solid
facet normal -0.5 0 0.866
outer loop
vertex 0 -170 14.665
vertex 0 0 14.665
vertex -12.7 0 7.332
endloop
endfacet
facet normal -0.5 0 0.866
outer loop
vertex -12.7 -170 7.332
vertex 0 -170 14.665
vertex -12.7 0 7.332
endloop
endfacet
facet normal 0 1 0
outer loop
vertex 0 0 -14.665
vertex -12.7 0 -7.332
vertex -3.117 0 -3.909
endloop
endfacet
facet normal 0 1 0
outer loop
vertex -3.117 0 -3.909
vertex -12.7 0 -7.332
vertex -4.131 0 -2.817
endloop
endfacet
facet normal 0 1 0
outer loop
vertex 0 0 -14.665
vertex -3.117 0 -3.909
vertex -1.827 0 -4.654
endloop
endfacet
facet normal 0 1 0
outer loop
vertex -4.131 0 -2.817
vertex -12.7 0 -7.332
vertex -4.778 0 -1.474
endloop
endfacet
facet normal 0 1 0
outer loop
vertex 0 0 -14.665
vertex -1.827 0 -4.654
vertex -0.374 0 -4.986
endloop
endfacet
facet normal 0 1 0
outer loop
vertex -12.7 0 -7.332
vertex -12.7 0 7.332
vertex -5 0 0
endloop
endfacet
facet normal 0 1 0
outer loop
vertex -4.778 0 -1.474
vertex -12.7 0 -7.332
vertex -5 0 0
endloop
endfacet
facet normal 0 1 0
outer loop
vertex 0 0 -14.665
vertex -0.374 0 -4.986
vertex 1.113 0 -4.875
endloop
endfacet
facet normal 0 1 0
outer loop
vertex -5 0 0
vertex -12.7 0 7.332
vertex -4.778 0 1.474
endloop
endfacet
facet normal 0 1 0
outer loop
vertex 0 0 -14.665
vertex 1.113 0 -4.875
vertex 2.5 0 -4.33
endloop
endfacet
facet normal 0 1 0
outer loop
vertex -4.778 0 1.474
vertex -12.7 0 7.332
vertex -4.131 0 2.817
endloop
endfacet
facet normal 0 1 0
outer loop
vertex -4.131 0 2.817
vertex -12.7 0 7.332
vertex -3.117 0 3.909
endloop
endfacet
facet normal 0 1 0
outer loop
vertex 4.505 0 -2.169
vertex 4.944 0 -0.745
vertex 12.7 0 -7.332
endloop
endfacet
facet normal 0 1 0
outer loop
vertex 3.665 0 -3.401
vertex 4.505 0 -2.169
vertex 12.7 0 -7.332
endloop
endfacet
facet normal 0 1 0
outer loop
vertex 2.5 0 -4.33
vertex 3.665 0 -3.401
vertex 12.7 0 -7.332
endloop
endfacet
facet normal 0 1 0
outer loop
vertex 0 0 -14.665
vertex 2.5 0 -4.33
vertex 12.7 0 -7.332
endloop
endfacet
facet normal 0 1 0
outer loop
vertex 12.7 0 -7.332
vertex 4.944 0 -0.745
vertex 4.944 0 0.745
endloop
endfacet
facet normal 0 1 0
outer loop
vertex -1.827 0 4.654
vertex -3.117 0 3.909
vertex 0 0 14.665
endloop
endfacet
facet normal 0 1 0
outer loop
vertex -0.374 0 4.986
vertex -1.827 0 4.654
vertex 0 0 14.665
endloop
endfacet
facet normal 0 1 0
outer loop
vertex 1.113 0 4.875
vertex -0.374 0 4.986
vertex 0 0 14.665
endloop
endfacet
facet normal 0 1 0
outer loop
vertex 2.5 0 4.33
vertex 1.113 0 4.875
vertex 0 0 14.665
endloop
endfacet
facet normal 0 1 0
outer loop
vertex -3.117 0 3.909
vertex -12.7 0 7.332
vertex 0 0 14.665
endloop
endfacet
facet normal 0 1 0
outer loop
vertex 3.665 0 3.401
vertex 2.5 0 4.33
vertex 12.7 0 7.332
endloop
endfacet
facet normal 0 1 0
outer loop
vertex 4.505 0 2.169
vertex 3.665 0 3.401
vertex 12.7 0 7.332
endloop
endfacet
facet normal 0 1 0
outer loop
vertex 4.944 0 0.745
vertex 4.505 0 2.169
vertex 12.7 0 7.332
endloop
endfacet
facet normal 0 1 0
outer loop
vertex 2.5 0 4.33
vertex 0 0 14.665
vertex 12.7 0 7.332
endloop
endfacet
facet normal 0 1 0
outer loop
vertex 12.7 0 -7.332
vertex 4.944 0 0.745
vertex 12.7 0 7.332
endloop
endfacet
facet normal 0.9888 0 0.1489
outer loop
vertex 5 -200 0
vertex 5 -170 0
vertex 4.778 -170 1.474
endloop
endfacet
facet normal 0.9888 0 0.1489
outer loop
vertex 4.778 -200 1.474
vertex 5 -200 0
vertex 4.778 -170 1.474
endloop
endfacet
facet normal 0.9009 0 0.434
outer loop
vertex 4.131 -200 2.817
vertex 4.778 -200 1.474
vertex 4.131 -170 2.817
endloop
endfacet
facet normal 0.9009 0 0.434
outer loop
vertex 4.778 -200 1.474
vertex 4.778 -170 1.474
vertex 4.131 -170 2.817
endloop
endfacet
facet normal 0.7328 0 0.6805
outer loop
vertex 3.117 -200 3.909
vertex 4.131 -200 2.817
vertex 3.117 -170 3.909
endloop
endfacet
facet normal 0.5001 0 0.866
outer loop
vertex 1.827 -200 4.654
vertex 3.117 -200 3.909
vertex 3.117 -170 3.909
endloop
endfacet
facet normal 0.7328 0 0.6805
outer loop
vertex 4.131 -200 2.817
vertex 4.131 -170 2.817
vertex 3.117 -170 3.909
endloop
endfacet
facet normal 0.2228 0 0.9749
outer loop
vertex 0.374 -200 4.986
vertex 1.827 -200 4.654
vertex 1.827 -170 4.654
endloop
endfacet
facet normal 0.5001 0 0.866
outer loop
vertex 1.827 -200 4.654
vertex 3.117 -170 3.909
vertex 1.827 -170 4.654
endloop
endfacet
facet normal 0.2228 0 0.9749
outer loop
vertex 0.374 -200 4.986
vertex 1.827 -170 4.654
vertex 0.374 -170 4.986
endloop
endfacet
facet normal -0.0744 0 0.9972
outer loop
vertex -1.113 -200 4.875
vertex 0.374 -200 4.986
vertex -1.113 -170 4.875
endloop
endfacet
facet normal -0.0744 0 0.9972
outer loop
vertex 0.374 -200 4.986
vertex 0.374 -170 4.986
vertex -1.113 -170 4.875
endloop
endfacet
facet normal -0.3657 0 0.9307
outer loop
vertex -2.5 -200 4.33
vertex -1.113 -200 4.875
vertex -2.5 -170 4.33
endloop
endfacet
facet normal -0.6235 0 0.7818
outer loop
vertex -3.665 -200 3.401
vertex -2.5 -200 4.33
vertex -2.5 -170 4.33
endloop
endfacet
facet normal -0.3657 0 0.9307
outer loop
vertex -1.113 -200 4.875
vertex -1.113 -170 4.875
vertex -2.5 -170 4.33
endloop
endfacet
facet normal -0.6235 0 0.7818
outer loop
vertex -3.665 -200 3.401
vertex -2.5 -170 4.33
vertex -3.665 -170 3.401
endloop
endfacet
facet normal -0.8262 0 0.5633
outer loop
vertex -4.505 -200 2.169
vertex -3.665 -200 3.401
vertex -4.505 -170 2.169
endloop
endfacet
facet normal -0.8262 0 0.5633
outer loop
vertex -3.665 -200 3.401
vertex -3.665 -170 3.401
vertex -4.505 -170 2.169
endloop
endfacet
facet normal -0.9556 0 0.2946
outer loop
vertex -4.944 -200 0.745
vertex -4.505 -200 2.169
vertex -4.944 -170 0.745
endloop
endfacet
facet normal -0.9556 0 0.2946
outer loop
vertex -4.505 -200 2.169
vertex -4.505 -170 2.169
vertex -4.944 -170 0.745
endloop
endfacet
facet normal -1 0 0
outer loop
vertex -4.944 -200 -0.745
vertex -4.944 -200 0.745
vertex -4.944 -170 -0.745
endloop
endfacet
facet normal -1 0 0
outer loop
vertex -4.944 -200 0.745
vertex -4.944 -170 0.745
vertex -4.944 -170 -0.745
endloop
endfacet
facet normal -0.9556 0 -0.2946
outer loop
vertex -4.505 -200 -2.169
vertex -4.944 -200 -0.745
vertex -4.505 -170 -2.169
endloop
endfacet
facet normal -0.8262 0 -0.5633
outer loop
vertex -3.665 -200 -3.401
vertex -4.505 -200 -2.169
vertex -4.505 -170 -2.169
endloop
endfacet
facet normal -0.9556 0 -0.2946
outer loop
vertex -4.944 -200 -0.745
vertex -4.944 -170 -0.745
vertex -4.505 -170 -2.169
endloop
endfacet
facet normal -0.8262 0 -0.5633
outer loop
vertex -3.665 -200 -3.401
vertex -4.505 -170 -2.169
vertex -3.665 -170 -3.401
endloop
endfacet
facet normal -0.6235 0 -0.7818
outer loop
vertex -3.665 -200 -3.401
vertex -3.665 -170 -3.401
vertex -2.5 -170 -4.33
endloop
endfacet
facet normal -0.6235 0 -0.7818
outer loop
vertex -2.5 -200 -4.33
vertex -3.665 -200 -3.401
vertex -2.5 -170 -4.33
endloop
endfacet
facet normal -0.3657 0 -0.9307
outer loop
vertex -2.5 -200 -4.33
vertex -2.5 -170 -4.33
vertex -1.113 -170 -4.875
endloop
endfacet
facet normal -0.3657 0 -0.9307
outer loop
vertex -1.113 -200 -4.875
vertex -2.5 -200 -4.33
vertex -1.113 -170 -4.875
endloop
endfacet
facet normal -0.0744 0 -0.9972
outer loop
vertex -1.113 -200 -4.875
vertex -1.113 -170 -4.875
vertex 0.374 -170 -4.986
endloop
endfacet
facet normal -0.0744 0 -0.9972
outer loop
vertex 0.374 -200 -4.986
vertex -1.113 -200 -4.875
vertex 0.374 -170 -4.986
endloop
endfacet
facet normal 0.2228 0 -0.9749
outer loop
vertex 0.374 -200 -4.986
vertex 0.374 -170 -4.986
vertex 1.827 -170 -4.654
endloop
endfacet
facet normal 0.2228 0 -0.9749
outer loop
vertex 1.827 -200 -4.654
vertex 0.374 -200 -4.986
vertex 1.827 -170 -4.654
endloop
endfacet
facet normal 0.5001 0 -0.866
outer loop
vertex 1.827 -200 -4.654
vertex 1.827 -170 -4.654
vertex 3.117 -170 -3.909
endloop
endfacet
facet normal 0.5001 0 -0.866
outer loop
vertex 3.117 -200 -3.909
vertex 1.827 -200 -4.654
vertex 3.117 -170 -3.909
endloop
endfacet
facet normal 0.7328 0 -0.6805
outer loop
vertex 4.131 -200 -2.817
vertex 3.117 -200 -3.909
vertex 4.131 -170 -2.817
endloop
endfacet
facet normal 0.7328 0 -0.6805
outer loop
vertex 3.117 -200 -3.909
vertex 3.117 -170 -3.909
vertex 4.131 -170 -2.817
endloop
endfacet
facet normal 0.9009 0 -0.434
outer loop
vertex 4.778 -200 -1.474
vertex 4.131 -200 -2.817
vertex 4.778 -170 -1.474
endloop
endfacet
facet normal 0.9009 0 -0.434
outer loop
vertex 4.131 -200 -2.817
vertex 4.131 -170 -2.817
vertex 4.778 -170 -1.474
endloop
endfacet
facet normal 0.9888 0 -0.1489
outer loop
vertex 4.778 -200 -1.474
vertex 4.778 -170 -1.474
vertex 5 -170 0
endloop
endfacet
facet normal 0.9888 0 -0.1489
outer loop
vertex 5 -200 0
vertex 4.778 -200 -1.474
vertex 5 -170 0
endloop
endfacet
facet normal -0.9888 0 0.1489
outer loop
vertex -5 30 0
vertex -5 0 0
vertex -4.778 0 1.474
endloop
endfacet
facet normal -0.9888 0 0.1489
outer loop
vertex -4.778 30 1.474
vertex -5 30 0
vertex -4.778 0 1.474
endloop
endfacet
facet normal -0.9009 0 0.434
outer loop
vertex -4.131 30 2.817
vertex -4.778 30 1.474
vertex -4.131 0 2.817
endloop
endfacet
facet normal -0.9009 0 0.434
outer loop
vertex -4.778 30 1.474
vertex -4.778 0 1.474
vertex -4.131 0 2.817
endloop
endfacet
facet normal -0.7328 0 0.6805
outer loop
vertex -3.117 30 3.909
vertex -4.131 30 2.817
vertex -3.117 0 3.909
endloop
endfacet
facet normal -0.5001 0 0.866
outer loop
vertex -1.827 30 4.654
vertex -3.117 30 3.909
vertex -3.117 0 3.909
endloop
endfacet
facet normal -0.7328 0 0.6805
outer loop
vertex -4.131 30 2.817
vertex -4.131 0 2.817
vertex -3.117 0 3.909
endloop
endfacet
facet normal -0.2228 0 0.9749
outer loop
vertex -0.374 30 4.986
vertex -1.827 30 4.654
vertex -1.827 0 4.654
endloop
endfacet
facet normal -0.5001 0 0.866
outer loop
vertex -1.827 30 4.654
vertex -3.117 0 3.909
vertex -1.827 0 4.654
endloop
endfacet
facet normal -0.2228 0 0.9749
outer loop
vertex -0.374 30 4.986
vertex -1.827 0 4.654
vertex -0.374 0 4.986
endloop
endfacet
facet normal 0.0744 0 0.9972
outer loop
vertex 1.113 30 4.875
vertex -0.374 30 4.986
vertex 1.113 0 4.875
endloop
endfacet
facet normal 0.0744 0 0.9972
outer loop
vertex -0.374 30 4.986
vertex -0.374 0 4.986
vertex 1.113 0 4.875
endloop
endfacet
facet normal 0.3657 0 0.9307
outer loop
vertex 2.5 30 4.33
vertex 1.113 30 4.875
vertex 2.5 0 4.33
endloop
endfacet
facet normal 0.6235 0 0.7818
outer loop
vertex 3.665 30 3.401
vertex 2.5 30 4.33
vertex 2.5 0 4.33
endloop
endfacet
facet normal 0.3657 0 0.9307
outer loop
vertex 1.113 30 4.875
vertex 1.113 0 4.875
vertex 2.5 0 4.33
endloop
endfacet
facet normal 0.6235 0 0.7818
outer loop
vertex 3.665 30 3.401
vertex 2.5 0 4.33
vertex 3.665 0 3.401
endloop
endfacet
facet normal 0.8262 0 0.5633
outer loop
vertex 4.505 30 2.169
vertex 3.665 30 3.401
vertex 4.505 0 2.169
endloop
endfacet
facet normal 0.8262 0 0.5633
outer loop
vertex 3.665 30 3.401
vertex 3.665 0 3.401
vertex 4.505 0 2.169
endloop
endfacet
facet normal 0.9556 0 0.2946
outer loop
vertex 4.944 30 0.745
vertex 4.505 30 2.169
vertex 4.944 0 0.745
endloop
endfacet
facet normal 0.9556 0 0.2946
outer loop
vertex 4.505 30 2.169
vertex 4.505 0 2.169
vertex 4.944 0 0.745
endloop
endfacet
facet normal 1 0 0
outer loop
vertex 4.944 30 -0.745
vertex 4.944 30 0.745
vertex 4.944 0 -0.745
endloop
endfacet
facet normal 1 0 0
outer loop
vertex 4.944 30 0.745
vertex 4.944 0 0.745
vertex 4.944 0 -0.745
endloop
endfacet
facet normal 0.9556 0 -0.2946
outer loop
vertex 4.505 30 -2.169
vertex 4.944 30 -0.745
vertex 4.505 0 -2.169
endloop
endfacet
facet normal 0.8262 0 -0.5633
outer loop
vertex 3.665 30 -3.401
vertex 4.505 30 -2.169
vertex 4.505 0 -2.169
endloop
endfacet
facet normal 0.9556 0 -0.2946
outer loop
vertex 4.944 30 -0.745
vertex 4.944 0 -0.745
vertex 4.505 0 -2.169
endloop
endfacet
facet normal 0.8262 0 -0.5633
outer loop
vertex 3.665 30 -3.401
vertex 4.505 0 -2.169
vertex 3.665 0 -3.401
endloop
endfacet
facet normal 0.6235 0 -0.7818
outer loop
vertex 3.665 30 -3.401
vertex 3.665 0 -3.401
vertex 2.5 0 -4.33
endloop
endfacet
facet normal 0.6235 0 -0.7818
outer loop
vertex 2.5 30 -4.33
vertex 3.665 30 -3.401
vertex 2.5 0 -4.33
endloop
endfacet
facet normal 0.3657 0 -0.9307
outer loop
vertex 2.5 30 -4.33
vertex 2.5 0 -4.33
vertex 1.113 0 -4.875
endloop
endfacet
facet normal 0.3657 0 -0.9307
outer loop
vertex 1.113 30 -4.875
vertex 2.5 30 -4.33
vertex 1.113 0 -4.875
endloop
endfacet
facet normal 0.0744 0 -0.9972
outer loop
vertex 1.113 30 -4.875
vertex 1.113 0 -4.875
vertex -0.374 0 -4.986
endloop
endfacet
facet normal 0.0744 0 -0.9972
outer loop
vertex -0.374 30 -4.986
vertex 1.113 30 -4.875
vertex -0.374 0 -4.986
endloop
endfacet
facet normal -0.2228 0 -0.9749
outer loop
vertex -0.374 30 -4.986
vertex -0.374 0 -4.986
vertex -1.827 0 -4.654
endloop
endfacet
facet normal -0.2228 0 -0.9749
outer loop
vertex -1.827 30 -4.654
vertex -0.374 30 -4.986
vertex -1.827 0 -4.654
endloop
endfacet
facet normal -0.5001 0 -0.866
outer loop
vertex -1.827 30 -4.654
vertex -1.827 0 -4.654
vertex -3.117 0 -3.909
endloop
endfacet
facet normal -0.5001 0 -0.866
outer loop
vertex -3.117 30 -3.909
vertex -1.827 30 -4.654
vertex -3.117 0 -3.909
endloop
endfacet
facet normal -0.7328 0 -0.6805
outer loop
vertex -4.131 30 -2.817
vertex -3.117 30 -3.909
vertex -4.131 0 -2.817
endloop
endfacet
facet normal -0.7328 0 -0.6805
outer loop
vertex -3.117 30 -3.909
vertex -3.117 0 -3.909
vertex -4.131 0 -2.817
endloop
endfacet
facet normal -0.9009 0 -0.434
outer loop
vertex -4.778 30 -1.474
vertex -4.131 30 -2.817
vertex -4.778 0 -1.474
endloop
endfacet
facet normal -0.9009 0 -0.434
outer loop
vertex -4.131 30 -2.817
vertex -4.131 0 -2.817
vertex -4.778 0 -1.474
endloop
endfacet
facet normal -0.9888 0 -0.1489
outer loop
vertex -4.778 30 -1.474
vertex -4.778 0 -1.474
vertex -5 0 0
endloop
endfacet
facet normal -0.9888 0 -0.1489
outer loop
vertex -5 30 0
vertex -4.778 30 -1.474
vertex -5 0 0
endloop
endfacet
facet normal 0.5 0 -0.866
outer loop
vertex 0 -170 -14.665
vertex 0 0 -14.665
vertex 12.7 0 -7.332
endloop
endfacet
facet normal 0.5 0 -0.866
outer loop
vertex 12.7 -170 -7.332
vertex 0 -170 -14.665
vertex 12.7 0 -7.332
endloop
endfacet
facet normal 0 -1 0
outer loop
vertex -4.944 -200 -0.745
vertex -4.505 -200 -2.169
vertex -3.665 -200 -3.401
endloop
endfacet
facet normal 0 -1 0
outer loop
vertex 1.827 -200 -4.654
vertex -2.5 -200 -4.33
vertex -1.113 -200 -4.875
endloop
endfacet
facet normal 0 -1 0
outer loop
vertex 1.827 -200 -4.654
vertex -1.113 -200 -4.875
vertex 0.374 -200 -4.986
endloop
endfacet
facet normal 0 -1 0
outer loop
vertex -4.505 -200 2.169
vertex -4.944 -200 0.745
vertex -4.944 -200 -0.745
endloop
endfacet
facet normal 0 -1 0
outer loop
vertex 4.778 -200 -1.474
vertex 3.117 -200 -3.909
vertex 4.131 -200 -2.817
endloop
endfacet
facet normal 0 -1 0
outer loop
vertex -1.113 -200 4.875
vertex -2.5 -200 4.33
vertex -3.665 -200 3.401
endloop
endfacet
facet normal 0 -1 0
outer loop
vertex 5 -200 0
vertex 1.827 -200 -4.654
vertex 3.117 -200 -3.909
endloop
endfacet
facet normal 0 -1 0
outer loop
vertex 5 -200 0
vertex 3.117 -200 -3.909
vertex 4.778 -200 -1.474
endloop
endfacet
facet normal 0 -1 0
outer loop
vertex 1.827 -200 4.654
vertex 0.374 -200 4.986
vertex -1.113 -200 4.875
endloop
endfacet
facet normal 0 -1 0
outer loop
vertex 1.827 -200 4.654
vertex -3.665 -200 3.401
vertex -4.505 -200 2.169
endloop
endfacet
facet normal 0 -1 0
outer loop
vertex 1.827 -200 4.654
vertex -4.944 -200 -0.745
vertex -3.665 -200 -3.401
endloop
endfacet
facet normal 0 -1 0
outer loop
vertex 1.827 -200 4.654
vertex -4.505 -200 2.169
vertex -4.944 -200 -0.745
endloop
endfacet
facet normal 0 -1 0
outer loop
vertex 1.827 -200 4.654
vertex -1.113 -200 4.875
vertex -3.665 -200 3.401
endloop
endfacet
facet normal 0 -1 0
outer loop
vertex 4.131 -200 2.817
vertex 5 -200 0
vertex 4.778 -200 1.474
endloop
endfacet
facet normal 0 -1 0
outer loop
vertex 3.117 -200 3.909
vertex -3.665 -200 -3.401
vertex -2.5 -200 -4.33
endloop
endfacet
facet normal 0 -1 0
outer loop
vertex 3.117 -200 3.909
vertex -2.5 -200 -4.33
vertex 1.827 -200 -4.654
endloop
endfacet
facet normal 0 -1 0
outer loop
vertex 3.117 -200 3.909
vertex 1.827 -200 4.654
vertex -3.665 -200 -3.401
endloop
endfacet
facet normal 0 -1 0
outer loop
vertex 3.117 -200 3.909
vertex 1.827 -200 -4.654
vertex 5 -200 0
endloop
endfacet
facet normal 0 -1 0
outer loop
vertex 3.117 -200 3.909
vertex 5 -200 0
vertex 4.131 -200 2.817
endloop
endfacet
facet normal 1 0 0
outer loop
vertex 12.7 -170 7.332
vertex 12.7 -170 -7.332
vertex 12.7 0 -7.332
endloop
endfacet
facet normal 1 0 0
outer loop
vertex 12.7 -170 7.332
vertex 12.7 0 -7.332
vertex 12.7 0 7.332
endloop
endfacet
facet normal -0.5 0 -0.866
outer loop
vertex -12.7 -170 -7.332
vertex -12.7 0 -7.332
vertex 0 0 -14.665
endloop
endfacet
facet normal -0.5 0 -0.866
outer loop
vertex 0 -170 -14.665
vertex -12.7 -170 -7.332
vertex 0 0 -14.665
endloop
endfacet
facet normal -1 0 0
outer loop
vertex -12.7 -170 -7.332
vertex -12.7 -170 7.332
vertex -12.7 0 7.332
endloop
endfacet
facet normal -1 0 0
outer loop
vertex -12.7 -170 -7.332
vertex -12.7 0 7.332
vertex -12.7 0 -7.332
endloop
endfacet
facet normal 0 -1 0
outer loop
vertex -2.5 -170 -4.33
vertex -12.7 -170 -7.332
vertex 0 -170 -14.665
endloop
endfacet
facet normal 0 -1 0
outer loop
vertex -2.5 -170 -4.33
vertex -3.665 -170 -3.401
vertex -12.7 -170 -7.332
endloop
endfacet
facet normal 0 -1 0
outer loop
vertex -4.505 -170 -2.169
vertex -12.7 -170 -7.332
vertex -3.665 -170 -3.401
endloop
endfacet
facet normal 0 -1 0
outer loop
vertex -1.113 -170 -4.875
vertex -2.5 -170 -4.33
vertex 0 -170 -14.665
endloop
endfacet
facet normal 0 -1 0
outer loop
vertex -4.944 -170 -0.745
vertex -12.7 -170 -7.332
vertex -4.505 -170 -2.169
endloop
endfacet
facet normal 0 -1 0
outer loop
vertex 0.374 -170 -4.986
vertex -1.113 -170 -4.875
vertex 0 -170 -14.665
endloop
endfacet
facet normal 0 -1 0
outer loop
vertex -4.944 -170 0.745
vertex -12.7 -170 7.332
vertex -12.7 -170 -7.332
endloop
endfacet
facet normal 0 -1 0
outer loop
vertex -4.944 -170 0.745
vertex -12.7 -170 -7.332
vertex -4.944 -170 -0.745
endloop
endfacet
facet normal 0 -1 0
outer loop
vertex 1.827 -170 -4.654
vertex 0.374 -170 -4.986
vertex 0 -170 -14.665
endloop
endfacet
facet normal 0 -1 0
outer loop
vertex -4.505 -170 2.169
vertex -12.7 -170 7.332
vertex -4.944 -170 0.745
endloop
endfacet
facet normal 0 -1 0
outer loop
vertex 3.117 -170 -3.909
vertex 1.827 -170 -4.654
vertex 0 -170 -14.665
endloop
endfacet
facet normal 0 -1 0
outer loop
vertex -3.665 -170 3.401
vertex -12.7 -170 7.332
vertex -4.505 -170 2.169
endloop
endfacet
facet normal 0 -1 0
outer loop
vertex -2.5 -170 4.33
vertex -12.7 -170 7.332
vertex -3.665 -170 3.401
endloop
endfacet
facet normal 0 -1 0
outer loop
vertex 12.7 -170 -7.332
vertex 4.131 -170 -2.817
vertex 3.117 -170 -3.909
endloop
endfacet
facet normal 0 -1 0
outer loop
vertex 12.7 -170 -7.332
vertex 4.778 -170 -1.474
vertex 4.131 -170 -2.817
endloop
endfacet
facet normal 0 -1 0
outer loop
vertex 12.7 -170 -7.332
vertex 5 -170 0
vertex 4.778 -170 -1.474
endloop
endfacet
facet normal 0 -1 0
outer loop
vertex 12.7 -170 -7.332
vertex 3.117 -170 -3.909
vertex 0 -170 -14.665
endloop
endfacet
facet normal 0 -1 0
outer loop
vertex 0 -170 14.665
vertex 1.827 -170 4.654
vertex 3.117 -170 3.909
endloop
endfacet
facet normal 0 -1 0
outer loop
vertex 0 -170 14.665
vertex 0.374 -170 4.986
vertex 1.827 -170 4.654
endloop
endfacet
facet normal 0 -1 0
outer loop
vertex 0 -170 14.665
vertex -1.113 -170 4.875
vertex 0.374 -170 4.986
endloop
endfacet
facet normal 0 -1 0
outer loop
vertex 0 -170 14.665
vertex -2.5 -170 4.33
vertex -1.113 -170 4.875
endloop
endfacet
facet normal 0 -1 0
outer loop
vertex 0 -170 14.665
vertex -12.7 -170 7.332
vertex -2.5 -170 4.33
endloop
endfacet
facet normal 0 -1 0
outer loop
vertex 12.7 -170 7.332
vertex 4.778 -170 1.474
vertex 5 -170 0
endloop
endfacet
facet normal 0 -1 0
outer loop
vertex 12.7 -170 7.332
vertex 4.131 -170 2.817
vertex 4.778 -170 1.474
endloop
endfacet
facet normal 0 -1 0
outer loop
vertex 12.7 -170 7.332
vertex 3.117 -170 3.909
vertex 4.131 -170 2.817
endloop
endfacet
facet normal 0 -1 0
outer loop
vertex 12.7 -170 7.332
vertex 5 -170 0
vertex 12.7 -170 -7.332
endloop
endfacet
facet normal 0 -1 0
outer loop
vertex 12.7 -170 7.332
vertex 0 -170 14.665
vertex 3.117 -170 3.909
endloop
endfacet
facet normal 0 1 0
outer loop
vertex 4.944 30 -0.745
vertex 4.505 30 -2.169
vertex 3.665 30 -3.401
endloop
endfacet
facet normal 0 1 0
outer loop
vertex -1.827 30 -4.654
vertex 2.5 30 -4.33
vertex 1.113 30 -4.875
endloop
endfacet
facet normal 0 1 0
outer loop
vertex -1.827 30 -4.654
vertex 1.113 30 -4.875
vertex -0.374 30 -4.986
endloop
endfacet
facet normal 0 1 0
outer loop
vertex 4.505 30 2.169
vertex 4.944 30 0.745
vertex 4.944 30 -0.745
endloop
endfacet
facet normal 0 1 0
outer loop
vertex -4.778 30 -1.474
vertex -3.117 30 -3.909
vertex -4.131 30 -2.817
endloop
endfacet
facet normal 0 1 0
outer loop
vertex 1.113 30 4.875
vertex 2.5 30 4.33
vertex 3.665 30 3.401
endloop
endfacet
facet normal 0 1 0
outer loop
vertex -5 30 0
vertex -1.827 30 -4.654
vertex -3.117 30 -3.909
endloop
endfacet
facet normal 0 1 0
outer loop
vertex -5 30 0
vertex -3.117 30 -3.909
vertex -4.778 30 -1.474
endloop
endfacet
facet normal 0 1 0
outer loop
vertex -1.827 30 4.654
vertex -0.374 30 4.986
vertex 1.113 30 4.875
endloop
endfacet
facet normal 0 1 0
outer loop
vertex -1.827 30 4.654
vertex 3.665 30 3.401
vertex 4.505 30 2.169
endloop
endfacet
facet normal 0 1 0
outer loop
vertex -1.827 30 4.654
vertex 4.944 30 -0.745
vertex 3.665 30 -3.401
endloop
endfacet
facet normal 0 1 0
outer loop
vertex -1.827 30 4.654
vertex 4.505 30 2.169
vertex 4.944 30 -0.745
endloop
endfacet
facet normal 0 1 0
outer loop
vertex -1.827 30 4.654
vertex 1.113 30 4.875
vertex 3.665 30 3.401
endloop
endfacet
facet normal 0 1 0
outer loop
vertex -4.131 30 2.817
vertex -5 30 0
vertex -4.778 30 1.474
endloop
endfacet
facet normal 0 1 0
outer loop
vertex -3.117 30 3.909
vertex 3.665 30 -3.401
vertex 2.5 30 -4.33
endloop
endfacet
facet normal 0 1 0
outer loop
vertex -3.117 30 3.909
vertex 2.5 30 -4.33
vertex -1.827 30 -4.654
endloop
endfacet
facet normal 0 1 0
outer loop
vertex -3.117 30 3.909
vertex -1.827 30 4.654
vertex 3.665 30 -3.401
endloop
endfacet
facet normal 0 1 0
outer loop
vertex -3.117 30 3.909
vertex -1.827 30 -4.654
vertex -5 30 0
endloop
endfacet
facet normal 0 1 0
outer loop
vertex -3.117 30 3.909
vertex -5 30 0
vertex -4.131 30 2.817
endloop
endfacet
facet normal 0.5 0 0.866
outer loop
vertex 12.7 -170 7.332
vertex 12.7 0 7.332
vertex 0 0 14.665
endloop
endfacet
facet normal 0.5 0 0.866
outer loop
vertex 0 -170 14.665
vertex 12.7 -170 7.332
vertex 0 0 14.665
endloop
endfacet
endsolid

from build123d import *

# Parameters (mm, degrees)
F1_DEPTH = 170
F2_R     = 5
F3_DEPTH = 30
F4_R     = 5
F5_DEPTH = 30


# Not quite as in the source:
# - a feature names something its author has since deleted; it is built from what else it names


with BuildPart() as f1:
    # F0 (on Front) → F1 (new body)
    with BuildSketch(Plane.XZ):
        Polygon((-12.7, 7.3323484187), (-12.7, -7.3323484187), (0, -14.6646968374), (12.7, -7.3323484187), (12.7, 7.3323484187), (0, 14.6646968374), align=None)
    extrude(amount=F1_DEPTH)

    # F2 (on face) → F3 (join)
    with BuildSketch(Plane(origin=(0, 0, 0), x_dir=(-1, 0, 0), z_dir=(0, 1, 0))):
        Circle(F2_R)
    extrude(amount=F3_DEPTH)

    # F4 (on face) → F5 (join)
    with BuildSketch(Plane.XZ.offset(170)):
        Circle(F4_R)
    extrude(amount=F5_DEPTH)


solid = f1.part
